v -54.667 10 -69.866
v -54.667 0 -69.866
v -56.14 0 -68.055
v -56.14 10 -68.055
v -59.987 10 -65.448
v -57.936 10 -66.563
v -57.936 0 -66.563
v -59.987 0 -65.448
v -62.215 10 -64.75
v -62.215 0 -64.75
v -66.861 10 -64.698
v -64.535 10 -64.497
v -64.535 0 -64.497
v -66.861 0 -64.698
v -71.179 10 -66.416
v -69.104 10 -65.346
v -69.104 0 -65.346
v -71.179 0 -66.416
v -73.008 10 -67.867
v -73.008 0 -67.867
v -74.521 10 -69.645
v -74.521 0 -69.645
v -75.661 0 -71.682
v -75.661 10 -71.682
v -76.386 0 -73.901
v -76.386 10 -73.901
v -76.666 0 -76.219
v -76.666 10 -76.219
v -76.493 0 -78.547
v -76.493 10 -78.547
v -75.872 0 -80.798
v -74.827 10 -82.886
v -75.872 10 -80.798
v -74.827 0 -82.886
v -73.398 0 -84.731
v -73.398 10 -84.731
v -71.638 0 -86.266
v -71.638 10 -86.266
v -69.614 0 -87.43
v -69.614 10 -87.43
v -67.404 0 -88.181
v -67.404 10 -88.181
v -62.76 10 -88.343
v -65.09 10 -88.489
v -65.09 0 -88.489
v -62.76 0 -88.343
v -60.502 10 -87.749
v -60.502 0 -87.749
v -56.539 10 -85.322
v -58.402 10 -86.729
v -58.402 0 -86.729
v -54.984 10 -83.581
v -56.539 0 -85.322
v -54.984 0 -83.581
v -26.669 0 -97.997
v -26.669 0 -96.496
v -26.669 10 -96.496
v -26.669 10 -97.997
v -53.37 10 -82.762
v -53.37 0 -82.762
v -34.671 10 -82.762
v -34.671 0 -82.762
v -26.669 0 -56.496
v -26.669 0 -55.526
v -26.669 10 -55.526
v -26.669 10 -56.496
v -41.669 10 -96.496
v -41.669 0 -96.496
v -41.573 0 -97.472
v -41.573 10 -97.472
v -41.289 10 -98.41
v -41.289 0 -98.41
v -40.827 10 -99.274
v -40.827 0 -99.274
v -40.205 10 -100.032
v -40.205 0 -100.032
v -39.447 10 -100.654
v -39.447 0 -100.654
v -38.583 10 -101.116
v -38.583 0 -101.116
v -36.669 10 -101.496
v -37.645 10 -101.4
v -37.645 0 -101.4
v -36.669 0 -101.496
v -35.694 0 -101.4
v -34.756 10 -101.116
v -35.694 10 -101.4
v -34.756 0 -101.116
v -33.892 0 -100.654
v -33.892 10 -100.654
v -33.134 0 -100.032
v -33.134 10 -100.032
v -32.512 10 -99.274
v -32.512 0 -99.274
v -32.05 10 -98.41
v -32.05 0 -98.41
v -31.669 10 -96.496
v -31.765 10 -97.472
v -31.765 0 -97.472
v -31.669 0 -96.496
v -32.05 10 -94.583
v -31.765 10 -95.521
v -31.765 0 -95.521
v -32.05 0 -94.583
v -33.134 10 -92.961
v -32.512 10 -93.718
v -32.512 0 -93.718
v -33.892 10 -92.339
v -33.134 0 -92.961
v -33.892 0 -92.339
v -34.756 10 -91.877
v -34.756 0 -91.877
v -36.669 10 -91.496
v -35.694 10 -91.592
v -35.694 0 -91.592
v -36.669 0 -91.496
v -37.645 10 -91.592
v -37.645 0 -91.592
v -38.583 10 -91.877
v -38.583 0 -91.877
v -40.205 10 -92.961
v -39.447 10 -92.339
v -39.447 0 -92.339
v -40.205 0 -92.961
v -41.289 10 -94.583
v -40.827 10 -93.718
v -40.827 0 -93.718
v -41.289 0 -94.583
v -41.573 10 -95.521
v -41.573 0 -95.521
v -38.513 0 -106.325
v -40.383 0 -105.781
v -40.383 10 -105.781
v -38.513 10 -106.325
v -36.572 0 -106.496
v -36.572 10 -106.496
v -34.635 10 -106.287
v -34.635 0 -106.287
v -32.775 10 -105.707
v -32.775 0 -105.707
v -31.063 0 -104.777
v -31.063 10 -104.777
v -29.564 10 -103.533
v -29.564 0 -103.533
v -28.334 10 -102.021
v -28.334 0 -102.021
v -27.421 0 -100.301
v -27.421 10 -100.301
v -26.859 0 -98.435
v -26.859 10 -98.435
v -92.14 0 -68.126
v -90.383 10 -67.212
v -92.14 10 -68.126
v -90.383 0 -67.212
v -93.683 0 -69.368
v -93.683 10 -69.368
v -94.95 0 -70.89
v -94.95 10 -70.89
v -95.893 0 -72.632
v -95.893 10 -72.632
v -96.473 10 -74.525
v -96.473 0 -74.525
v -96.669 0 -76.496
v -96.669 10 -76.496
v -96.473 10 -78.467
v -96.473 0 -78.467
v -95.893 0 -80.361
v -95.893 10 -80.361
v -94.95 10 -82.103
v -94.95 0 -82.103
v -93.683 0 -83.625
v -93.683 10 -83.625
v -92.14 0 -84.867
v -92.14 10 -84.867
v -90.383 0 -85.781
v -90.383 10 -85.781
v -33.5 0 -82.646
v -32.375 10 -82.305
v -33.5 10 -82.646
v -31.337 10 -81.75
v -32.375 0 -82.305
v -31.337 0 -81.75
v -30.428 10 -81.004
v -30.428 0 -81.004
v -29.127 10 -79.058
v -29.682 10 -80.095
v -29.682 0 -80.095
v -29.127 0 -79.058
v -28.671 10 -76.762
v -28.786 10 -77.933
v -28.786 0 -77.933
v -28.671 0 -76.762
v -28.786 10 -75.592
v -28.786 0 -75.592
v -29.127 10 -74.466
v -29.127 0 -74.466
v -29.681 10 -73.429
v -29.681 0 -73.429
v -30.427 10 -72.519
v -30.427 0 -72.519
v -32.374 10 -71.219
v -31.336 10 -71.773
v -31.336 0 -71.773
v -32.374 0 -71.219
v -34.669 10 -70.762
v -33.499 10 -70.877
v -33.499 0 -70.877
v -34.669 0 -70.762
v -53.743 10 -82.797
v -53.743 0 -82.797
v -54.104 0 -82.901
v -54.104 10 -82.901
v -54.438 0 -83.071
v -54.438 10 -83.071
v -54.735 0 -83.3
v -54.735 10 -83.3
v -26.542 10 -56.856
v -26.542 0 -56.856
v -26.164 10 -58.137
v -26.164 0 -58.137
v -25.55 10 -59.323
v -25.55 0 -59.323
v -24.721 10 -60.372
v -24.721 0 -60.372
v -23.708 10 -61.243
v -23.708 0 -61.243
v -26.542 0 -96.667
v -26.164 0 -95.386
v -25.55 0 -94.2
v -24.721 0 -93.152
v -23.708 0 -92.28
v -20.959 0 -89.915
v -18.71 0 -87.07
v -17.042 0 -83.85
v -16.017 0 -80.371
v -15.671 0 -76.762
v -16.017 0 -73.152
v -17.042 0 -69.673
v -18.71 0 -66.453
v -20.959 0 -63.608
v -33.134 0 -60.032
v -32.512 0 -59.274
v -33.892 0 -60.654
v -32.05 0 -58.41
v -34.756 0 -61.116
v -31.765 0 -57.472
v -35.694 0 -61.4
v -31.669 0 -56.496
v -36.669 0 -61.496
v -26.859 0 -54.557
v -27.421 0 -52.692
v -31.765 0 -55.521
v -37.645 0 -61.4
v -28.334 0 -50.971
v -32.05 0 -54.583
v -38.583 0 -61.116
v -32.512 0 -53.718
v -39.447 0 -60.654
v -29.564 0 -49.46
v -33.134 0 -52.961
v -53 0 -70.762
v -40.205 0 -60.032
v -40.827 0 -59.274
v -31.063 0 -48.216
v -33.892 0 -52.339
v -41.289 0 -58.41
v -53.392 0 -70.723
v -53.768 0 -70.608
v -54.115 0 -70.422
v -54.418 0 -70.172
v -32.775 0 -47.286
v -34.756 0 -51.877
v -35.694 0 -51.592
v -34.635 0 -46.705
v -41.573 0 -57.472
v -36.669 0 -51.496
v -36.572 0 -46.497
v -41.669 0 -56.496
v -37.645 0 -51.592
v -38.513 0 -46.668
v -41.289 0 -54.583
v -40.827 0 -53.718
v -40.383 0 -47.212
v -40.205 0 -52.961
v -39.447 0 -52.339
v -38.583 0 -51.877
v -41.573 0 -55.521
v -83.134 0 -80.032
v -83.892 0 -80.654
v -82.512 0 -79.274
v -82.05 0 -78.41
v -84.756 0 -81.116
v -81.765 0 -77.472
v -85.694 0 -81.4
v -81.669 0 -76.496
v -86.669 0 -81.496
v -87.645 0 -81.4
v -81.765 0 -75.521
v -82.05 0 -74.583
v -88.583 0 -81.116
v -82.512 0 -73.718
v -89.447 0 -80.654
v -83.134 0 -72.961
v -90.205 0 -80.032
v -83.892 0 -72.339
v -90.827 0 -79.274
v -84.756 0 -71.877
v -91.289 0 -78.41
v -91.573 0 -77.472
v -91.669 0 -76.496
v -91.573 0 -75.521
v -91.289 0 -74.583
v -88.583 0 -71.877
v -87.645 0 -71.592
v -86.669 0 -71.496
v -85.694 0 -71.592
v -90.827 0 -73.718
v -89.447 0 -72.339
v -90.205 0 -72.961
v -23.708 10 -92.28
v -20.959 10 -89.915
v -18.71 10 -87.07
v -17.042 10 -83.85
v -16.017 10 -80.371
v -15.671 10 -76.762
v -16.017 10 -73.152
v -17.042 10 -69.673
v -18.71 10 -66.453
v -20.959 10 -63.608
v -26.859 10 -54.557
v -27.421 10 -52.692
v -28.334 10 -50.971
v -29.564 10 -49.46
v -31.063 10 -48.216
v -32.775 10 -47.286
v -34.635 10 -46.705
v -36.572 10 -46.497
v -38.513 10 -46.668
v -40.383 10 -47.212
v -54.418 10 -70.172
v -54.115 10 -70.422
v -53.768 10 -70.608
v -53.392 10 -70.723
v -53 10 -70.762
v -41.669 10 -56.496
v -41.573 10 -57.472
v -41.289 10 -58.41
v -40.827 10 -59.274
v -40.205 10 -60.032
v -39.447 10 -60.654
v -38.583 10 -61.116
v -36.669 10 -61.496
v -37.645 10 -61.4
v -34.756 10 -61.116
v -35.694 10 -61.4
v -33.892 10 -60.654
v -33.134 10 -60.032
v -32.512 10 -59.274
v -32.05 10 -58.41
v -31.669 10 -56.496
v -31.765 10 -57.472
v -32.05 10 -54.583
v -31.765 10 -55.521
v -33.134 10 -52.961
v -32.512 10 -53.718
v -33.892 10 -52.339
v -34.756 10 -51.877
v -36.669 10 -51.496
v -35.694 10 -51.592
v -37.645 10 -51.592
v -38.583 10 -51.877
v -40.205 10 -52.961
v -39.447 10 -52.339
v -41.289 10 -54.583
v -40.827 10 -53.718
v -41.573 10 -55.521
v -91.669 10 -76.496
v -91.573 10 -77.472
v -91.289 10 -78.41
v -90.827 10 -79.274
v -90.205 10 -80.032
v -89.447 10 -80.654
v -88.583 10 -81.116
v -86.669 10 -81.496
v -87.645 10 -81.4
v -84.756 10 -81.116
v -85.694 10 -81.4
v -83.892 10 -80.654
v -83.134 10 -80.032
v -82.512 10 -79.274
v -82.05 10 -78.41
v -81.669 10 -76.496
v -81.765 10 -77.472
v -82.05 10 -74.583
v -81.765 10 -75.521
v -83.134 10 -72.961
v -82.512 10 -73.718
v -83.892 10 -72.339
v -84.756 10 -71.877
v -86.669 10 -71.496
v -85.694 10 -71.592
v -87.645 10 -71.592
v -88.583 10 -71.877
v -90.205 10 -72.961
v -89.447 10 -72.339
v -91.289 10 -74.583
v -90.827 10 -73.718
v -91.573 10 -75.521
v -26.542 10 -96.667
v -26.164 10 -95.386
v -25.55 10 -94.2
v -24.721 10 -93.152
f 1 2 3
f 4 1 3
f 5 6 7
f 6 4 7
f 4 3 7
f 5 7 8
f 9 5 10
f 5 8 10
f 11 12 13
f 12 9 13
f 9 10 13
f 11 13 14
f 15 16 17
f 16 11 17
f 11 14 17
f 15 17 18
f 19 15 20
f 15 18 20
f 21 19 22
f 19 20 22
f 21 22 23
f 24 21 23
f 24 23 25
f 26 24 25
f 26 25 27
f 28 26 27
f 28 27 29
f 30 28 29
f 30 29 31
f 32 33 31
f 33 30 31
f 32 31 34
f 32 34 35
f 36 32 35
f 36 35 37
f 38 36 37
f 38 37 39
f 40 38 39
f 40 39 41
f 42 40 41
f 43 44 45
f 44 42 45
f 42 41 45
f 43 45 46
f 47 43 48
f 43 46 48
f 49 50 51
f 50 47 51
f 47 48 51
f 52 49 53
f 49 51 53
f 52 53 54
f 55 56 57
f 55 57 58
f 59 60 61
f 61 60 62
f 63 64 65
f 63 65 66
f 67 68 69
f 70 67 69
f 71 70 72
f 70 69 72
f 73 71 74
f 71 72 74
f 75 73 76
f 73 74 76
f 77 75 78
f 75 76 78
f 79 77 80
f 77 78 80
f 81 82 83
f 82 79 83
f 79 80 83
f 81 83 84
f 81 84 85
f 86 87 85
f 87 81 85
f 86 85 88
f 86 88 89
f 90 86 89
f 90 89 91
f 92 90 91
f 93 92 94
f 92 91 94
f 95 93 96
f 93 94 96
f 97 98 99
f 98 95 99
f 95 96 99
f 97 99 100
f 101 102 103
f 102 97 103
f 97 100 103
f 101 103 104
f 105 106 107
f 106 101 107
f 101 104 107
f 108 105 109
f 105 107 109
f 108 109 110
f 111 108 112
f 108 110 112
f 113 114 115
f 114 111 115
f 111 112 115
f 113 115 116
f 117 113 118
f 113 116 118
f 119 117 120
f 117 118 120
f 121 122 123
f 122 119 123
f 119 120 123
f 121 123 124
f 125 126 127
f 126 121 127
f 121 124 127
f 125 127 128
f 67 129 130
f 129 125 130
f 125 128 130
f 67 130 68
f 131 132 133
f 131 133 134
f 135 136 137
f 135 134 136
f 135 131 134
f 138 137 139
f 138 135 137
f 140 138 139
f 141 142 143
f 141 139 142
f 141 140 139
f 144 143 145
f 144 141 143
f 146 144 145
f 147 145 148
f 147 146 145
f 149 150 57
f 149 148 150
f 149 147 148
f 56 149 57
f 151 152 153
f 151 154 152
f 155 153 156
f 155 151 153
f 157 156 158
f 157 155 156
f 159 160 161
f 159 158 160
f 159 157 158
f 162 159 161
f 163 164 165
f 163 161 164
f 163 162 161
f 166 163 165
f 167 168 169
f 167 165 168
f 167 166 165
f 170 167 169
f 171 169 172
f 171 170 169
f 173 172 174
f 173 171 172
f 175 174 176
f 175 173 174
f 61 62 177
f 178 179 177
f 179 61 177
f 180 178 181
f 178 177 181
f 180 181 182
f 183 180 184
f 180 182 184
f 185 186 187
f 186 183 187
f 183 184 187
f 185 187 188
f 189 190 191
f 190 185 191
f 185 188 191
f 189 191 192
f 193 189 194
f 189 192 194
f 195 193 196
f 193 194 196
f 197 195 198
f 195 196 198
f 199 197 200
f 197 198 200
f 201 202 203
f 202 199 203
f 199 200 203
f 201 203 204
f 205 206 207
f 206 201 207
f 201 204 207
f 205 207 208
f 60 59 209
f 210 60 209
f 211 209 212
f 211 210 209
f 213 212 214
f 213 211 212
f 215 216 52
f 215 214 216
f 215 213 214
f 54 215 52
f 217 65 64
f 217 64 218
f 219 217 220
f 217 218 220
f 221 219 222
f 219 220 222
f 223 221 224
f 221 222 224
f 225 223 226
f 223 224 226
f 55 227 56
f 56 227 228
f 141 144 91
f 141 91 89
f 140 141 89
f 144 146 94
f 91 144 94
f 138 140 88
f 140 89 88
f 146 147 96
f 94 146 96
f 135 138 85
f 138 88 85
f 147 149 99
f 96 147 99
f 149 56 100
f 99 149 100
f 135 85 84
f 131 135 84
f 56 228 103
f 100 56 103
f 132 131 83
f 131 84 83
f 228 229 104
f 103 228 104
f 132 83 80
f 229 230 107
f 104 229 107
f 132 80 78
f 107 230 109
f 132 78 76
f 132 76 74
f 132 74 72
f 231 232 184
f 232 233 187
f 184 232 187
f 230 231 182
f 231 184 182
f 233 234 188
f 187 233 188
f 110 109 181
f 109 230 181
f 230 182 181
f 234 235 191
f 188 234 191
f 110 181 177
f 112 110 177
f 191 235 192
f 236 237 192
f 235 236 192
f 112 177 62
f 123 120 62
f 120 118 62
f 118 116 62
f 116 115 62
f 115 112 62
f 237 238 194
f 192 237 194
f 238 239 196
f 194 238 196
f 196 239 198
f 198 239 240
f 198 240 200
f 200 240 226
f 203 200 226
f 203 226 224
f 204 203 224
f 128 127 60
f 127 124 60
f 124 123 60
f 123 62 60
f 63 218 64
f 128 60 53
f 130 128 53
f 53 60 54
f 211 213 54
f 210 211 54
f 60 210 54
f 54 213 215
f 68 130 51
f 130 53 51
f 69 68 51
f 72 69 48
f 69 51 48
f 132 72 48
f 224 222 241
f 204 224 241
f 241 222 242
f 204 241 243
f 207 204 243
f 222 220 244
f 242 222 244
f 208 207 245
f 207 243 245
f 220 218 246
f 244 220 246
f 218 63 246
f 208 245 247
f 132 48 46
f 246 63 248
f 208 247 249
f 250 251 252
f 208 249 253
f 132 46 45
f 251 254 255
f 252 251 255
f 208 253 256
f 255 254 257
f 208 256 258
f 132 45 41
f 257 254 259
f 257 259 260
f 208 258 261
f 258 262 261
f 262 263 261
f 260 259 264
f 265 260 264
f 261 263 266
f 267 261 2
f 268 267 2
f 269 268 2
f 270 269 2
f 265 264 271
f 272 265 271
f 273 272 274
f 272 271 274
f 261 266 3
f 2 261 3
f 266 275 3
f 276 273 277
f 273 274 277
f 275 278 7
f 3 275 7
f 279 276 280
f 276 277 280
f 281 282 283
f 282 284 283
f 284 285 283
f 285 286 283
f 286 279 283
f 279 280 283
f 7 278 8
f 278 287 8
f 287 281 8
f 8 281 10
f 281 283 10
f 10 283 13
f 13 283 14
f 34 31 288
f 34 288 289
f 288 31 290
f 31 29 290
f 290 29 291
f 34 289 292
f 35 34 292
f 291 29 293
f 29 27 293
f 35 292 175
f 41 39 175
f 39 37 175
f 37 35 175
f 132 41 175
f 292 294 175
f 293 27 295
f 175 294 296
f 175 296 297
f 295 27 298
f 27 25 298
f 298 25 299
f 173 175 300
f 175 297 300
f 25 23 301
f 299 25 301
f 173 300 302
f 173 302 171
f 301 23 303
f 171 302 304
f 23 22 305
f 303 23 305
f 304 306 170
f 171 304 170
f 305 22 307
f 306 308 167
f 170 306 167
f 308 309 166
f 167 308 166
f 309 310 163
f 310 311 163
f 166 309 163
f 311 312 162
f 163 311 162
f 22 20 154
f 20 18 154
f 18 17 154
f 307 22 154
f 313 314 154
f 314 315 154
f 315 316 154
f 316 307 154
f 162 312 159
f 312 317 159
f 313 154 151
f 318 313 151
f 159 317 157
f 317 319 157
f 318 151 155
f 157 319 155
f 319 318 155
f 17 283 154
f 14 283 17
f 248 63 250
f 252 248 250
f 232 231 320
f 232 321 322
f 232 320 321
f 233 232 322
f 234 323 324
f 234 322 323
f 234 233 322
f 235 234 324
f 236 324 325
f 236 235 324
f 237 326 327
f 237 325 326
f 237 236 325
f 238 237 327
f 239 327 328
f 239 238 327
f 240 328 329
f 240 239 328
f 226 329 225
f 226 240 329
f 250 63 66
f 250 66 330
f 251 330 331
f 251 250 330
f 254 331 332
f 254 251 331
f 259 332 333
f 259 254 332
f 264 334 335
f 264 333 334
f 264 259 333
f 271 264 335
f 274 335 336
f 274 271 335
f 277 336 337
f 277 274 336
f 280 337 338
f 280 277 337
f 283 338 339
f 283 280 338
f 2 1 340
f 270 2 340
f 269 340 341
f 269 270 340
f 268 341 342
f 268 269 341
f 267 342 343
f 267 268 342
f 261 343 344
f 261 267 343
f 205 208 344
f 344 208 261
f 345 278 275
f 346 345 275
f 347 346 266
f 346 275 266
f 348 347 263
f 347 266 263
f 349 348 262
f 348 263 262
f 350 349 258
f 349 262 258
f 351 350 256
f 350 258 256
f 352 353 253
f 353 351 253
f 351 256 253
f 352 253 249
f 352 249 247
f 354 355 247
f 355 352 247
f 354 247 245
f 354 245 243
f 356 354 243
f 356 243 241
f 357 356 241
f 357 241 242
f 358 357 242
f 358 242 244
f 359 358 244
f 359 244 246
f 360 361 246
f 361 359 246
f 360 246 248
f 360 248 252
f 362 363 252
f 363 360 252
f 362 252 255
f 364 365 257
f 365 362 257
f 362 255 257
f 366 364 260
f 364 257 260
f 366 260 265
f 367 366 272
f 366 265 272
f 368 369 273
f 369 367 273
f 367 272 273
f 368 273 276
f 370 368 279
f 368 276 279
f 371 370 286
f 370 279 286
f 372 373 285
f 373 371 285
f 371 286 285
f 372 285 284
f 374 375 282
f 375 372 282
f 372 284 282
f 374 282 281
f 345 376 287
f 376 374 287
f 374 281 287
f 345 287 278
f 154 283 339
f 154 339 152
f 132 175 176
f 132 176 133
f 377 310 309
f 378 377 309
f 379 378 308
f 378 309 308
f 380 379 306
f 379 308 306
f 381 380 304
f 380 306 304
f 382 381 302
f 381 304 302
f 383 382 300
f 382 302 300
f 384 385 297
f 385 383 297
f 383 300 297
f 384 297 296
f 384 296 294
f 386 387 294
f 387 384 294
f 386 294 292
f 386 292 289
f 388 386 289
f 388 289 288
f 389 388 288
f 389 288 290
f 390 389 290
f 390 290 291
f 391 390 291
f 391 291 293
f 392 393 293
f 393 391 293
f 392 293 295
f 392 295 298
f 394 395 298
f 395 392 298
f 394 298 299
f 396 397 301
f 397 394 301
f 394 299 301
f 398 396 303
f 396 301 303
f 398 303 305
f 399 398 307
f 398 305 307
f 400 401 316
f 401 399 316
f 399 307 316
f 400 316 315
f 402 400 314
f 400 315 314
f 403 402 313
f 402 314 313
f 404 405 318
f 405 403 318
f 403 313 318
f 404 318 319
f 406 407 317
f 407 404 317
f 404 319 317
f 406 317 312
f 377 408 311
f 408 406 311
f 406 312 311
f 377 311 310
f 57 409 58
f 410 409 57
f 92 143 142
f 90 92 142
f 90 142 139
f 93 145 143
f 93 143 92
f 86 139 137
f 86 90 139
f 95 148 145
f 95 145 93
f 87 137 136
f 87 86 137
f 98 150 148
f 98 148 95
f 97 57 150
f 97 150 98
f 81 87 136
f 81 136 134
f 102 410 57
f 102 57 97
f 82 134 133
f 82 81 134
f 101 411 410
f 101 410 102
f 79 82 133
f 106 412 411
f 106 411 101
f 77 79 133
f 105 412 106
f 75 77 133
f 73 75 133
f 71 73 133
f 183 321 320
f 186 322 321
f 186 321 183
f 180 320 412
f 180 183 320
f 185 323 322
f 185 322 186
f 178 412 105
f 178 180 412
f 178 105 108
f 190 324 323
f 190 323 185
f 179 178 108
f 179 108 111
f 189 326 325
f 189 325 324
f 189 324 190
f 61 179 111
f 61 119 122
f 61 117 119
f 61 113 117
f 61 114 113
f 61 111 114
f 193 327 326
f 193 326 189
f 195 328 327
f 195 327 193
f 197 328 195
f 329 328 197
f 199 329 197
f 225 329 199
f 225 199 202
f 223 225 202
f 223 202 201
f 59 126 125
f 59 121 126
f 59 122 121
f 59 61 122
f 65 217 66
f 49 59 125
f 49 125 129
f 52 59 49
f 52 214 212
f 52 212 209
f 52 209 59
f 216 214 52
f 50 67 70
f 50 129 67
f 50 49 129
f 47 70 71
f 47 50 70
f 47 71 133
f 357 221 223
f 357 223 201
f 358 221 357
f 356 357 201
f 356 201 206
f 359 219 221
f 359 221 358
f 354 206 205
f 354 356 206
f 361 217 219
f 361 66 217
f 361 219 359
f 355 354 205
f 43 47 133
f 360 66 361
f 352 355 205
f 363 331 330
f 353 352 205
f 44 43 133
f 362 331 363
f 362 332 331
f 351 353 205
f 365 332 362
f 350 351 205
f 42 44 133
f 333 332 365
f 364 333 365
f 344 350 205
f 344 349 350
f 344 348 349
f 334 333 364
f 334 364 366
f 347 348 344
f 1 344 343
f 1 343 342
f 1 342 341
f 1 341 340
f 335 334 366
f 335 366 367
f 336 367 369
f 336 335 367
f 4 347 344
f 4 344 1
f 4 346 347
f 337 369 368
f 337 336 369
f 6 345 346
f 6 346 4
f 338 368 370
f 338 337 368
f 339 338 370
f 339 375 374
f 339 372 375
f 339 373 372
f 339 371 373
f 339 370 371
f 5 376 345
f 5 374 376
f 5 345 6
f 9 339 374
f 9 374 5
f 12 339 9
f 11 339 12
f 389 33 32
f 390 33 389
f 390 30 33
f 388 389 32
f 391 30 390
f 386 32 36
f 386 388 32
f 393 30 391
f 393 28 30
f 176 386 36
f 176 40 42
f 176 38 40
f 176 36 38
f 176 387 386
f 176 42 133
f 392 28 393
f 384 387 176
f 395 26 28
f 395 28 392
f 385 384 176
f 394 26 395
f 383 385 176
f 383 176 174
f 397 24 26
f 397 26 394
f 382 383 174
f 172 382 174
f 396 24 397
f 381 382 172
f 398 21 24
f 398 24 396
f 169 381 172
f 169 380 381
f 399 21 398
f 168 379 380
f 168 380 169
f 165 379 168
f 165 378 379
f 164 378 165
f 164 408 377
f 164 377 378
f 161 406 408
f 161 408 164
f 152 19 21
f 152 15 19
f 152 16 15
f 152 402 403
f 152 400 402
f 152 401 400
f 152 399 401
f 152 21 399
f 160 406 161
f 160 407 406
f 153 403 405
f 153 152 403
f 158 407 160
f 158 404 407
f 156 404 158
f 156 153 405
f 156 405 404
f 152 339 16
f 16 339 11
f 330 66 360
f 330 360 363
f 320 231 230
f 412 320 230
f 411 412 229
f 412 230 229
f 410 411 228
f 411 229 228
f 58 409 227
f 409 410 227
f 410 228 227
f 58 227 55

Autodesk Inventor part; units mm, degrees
ref_plane "YZ Plane" through (0, 0, 0) normal (1, 0, 0) x (0, 1, 0)
ref_plane "XZ Plane" through (0, 0, 0) normal (0, 1, 0) x (-1, 0, 0)
ref_plane "XY Plane" through (0, 0, 0) normal (0, 0, 1) x (1, 0, 0)
sketch "Sketch1" plane through (0, 0, 0) normal (0, 1, 0) x (-1, 0, 0)
  arc A0 (90.3834, -85.781) -> (90.3834, -67.2115) centre (86.6694, -76.4962) ccw
  arc A1 (40.3834, -47.2115) -> (26.6694, -56.4962) centre (36.6694, -56.4962) ccw
  arc A2 (26.6694, -96.4962) -> (40.3834, -105.781) centre (36.6694, -96.4962) ccw
  line L0 (40.3834, -47.2115) -> (90.3834, -67.2115)
  line L1 (90.3834, -85.781) -> (40.3834, -105.781)
  circle A3 centre (86.6694, -76.4962) radius 5
  circle A4 centre (36.6694, -56.4962) radius 5
  circle A5 centre (36.6694, -96.4962) radius 5
  arc A6 (54.9839, -83.5808) -> (54.6671, -69.8665) centre (64.6694, -76.4962) ccw
  arc A7 (34.6694, -70.7615) -> (34.6706, -82.7615) centre (34.6706, -76.7615) ccw
  line L2 (34.6694, -70.7615) -> (53.0001, -70.7615)
  line L3 (53.3697, -82.7615) -> (34.6706, -82.7615)
  arc A8 (23.7082, -61.243) -> (23.7082, -92.2801) centre (34.6706, -76.7615) ccw
  line L4 (26.6694, -96.4962) -> (26.6694, -97.9974)
  line L5 (26.6694, -55.5256) -> (26.6694, -56.4962)
  arc A9 (23.7082, -61.243) -> (26.6694, -55.5256) centre (19.6694, -55.5256) ccw
  arc A10 (26.6694, -97.9974) -> (23.7082, -92.2801) centre (19.6694, -97.9974) ccw
  arc A11 (53.0001, -70.7615) -> (54.6671, -69.8665) centre (53.0001, -68.7615) ccw
  arc A12 (54.9839, -83.5808) -> (53.3697, -82.7615) centre (53.3697, -84.7615) ccw
  point P0 (0, 0)
  point P1 (54.4349, -82.7615)
  point P2 (54.1284, -70.7615)
  point P3 (26.6694, -59.5284)
  point P4 (26.6694, -93.9947)
  dimension "d0" = 50
  dimension "d1" = 0
  dimension "d2" = 20
  dimension "d3" = 20
  dimension "d4" = 20
  dimension "d5" = 40
  dimension "d6" = 20
  dimension "d7" = 10
  dimension "d8" = 10
  dimension "d9" = 10
  dimension "d10" = 12
  dimension "d11" = 30
  dimension "d12" = 6
  dimension "d13" = 0
  dimension "d14" = 22
  dimension "d16" = 7
  dimension "d17" = 7
  dimension "d18" = 2
extrude "Extrusion1" add sketch "Sketch1" along normal blind 10
equation "\"d3\" = d2"
equation "\"d4\" = d2"
equation "\"d6\" = 0.5 * d5"
equation "\"d8\" = d7"
equation "\"d9\" = d7"
